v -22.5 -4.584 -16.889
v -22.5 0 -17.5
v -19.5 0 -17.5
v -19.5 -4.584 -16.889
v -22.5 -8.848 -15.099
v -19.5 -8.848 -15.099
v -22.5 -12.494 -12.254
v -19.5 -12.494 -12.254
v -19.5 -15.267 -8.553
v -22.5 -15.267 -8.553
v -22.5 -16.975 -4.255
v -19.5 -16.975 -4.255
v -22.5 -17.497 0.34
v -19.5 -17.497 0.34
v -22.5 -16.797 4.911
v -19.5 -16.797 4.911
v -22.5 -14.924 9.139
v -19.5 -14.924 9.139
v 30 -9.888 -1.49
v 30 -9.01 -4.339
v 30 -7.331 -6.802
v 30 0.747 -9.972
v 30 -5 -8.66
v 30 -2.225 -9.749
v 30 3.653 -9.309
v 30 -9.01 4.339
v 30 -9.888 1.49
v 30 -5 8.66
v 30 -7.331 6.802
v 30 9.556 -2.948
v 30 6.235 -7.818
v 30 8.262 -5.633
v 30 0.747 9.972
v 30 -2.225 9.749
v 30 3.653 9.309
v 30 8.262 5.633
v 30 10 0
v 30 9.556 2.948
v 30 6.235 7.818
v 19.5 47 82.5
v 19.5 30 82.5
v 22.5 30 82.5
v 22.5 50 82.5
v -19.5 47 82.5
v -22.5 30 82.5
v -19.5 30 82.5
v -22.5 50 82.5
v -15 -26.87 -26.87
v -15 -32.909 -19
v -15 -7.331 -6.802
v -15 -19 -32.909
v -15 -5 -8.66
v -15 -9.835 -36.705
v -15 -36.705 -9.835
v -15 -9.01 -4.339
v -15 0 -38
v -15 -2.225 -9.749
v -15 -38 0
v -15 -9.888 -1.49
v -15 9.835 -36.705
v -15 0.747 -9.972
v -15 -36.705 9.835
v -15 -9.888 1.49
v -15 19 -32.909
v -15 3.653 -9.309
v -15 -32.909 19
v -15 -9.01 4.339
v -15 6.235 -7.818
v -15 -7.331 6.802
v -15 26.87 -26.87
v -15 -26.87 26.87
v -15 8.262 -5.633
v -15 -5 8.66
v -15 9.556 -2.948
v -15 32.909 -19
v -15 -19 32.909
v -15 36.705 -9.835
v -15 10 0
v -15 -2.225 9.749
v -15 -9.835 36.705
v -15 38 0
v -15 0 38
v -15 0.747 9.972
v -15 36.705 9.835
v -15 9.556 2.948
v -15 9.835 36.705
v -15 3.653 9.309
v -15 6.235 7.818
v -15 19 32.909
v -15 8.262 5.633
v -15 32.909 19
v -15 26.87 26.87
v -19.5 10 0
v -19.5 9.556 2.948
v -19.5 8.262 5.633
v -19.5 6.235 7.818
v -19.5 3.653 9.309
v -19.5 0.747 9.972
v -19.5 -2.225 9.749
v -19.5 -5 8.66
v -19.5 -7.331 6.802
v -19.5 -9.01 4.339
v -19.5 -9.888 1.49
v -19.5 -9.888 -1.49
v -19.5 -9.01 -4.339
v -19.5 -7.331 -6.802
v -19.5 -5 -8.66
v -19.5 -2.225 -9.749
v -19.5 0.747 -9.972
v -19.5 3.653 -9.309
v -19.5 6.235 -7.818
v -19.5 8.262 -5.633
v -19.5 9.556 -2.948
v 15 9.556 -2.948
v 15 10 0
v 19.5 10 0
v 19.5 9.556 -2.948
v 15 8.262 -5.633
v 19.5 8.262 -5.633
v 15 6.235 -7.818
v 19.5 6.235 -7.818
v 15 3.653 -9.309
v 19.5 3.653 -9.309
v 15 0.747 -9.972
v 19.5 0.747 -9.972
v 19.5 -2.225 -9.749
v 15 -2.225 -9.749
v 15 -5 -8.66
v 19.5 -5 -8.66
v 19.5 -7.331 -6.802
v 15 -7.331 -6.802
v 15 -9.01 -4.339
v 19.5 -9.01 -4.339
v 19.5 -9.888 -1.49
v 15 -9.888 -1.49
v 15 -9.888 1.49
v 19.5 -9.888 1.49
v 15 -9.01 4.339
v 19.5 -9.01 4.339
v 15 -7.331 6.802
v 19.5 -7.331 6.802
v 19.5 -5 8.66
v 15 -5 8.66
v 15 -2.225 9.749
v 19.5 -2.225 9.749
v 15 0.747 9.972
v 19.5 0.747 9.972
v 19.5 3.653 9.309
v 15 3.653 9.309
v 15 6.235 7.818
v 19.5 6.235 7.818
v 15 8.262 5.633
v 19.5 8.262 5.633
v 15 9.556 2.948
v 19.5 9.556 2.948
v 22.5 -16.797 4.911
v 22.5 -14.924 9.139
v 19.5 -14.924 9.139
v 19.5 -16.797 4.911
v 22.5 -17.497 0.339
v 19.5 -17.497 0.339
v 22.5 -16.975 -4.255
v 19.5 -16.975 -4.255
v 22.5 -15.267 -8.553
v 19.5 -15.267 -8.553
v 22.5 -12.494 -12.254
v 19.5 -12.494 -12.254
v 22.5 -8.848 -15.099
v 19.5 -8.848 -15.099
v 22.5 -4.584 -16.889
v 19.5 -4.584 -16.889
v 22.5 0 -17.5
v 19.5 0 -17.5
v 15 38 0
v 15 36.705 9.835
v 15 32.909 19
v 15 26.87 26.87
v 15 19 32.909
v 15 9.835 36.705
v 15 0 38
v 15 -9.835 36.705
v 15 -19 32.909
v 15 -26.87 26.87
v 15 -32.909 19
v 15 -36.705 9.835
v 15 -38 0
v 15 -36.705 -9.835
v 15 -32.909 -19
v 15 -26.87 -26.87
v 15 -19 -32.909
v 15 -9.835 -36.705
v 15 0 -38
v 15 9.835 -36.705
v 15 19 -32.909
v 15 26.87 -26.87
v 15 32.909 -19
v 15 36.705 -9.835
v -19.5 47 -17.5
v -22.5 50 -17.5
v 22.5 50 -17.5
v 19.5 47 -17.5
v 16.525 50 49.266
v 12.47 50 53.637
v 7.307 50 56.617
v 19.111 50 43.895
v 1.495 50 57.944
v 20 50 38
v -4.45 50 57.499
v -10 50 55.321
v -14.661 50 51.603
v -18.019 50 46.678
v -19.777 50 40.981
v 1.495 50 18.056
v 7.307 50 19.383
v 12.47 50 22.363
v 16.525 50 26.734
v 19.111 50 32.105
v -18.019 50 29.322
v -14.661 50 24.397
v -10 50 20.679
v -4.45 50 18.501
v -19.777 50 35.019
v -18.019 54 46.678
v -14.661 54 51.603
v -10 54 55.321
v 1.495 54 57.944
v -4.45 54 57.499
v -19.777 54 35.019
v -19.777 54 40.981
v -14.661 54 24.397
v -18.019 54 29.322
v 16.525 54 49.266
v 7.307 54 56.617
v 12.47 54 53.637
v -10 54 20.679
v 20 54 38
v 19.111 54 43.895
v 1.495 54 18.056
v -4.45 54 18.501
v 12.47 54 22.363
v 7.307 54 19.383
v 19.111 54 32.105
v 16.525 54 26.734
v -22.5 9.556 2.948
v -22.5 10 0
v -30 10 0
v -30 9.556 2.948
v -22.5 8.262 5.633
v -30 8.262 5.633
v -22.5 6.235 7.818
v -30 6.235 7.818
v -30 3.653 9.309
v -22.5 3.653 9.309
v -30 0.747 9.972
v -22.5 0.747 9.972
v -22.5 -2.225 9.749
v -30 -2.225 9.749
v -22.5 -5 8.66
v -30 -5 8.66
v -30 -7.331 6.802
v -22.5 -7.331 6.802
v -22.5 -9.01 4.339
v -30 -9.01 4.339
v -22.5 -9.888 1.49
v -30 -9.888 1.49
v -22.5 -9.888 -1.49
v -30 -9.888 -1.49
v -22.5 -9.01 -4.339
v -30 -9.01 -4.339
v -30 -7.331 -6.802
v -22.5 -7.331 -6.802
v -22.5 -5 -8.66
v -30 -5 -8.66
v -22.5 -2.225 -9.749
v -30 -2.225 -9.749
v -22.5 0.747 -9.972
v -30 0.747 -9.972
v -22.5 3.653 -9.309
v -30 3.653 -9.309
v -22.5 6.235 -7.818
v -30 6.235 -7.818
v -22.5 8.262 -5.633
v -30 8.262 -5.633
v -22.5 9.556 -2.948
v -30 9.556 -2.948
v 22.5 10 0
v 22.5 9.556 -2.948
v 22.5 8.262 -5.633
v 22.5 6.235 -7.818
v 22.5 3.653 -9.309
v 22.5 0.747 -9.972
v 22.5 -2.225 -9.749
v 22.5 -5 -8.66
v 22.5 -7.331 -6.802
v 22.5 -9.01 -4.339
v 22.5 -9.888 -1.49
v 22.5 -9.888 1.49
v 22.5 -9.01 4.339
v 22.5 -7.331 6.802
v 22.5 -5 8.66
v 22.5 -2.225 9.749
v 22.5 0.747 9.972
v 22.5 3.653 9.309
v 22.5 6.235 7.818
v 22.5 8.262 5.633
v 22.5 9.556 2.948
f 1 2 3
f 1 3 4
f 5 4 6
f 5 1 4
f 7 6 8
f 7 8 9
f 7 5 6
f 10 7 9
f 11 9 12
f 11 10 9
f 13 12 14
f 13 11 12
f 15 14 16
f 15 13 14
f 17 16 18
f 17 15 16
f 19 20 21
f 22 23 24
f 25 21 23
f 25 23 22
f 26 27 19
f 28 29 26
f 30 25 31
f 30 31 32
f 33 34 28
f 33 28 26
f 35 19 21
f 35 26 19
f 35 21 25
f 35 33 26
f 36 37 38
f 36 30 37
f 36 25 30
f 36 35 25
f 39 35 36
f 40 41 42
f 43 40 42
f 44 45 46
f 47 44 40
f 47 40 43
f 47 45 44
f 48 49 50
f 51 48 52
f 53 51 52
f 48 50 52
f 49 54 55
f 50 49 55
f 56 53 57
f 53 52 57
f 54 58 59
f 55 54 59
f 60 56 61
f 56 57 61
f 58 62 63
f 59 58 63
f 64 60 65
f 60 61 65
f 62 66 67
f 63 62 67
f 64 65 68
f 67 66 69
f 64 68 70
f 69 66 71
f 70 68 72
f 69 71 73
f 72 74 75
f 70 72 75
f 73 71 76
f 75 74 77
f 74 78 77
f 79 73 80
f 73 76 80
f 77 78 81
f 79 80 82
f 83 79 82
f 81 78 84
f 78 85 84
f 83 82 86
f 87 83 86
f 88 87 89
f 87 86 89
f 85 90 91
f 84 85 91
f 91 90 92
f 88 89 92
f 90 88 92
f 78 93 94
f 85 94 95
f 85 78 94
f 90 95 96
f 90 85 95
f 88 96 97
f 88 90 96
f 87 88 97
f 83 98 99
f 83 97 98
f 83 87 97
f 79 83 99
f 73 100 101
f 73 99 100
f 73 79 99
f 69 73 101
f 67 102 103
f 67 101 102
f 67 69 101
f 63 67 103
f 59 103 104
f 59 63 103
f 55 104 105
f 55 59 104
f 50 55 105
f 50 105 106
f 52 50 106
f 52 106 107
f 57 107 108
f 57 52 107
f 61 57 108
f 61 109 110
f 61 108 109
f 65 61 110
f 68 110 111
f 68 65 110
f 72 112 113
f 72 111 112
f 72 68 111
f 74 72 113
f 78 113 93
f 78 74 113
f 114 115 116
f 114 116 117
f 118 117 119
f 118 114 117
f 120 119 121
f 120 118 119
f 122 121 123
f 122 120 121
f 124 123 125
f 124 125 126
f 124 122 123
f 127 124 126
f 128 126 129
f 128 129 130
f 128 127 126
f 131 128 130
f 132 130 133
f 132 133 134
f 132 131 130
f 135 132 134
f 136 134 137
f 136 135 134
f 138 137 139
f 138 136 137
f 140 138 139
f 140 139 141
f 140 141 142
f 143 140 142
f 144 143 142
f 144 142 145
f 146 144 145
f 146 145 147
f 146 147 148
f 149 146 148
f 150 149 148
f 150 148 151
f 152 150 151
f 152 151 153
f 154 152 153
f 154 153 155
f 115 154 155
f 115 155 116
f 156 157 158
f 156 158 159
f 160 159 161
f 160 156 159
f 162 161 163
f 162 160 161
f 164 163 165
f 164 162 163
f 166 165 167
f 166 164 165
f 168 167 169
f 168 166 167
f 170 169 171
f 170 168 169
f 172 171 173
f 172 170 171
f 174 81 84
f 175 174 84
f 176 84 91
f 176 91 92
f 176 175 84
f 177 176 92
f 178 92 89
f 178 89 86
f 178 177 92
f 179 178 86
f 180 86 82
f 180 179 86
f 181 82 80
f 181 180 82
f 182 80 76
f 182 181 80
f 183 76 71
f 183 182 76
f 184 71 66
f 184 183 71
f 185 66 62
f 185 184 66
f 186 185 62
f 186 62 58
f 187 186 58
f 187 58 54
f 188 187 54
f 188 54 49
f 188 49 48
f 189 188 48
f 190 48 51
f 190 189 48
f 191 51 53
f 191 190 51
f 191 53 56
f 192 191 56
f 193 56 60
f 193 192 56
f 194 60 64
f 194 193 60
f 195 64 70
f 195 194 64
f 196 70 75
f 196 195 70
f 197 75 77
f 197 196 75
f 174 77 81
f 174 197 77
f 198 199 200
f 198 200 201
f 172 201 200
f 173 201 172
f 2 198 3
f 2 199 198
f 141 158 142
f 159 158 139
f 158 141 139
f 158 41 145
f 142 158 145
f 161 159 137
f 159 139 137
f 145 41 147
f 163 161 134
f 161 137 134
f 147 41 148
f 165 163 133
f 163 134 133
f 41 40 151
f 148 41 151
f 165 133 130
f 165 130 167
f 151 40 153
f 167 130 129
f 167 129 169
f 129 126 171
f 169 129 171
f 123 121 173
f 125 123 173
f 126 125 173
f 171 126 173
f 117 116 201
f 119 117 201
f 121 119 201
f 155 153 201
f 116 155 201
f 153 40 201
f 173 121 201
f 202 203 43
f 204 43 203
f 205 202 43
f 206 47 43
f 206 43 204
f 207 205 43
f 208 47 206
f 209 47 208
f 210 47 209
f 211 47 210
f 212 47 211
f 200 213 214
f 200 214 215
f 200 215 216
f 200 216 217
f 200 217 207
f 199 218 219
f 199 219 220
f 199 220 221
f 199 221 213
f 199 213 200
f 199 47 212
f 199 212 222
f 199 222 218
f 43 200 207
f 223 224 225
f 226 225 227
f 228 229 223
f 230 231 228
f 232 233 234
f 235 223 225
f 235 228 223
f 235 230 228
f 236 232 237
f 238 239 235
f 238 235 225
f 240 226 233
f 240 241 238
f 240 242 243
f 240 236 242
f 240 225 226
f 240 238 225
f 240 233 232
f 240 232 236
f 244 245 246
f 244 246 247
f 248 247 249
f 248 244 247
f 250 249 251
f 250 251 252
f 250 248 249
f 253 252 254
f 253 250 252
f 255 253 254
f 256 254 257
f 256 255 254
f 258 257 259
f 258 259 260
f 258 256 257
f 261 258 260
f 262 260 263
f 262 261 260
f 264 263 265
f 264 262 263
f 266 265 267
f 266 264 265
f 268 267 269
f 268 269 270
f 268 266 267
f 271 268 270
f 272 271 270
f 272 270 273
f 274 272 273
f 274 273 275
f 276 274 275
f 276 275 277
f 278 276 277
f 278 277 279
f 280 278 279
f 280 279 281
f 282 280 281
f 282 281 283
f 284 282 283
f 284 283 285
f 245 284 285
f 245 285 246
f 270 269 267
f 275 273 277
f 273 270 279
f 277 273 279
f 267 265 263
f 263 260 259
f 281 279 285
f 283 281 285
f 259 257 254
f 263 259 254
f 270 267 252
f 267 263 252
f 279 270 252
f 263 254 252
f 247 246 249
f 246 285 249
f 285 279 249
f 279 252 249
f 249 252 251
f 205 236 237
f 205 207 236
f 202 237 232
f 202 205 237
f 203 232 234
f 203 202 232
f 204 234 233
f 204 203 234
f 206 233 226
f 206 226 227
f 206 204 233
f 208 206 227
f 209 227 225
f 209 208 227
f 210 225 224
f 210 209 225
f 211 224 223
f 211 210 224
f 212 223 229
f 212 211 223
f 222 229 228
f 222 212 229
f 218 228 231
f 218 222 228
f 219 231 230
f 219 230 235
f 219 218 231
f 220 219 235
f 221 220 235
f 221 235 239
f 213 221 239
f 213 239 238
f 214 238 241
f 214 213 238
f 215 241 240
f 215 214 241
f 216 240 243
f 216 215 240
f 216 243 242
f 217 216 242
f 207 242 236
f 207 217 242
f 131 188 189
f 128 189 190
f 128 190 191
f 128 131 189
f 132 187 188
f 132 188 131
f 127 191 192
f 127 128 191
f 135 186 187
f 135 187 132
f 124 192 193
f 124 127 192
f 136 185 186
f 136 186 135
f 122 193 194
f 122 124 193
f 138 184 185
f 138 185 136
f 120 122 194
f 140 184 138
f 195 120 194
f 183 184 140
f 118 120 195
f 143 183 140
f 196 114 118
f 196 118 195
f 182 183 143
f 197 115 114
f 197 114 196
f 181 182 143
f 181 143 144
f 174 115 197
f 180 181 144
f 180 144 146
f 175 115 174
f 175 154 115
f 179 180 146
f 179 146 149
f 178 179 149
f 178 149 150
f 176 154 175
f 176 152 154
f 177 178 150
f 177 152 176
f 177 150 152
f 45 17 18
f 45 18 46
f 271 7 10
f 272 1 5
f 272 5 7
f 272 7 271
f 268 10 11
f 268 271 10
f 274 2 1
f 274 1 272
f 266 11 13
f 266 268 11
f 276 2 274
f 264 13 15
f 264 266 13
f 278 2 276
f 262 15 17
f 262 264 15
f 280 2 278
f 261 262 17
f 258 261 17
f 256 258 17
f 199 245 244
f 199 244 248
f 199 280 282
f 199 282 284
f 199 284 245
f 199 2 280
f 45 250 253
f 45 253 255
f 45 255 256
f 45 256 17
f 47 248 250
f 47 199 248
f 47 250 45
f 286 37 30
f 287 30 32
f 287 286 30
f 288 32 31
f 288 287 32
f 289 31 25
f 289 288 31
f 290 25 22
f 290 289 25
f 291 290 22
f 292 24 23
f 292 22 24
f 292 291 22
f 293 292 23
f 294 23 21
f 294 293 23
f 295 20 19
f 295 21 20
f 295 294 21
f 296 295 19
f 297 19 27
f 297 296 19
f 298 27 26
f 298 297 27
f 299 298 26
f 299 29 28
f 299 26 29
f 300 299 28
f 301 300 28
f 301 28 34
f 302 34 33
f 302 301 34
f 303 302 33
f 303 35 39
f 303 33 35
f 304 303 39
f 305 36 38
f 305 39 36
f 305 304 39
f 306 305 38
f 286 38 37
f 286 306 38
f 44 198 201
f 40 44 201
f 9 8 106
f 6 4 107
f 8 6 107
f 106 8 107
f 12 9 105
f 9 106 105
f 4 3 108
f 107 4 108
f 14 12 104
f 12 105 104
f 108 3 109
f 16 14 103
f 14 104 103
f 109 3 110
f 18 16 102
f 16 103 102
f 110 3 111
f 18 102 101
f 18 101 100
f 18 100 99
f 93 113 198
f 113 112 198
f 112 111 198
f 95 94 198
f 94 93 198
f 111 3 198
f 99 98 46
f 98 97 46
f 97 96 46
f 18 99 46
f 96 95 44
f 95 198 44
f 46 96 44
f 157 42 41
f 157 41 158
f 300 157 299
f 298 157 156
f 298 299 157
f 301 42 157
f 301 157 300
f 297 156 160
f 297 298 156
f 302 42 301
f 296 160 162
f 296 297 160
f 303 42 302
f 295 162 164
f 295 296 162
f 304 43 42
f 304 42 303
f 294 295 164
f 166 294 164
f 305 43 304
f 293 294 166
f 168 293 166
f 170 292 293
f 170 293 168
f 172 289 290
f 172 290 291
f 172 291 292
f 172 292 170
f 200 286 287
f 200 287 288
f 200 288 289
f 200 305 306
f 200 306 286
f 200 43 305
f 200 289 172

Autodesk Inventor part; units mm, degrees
ref_plane "YZ Plane" through (0, 0, 0) normal (1, 0, 0) x (0, 1, 0)
sketch "Sketch1" plane through (0, 0, 0) normal (1, 0, 0) x (0, 1, 0)
  circle A0 centre (0, 0) radius 38
  dimension "d0" = 76
extrude "Extrusion1" add sketch "Sketch1" along normal mid plane 30
sketch "Sketch2" plane through (0, 0, 0) normal (1, 0, 0) x (0, 1, 0)
  circle A0 centre (0, 0) radius 10
  dimension "d3" = 20
extrude "Extrusion2" add sketch "Sketch2" along normal mid plane 60
ref_plane "Work Plane1" through (22.5, 0, 0) normal (1, 0, 0) x (0, 0, -1)
sketch "Sketch3" plane through (22.5, 0, 0) normal (1, 0, 0) x (0, 0, -1)
  circle A0 centre (0, 0) radius 10 projected
  circle A1 centre (0, 0) radius 10
  circle A2 centre (0, 0) radius 17.5
  line L0 (-82.5, 50) -> (17.5, 50)
  circle A3 centre (0, 0) radius 38 projected
  line L1 (17.5, 0) -> (17.5, 50)
  line L2 (-82.5, 50) -> (-82.5, 30)
  line L3 (-82.5, 30) -> (-9.1391, -14.9241)
  point P0 (-38, 0)
  dimension "d6" = 35
  dimension "d7" = 50
  dimension "d8" = 100
  dimension "d9" = 20
extrude "Extrusion3" add sketch "Sketch3" against normal blind 3 contours A2 | A2 L3 A3 L1 | A3 L3 L2 L0 L1 picked at (-15.7584, 26.6707)
ref_plane "Work Plane2" through (-22.5, 0, 0) normal (-1, 0, 0) x (0, 0, 1)
sketch "Sketch4" plane through (-22.5, 0, 0) normal (-1, 0, 0) x (0, 0, 1)
  line L0 (9.1391, -14.9241) -> (82.5, 30) projected
  line L1 (82.5, 30) -> (82.5, 50) projected
  line L2 (82.5, 50) -> (-17.5, 50) projected
  line L3 (-17.5, 50) -> (-17.5, 0) projected
  arc A0 (-17.5, 0) -> (9.1391, -14.9241) centre (0, 0) ccw projected
  circle A1 centre (0, 0) radius 10 projected
extrude "Extrusion4" add sketch "Sketch4" against normal blind 3
sketch "Sketch5" plane through (-22.5, 50, 82.5) normal (0, 1, 0) x (1, 0, 0)
  line L0 (0, 0) -> (0, 100) projected
  line L1 (0, 0) -> (3, 0) projected
  line L2 (3, 100) -> (3, 0) projected
  line L3 (0, 100) -> (3, 100) projected
  line L4 (45, 100) -> (45, 0) projected
  line L5 (45, 100) -> (42, 100) projected
  line L6 (42, 0) -> (42, 100) projected
  line L7 (45, 0) -> (42, 0) projected
  line L8 (0, 100) -> (45, 100)
  line L9 (45, 100) -> (45, 0)
  line L10 (45, 0) -> (0, 0)
  line L11 (0, 0) -> (0, 100)
  point P0 (22.5, 82.5)
extrude "Extrusion5" add sketch "Sketch5" against normal blind 3
sketch "Sketch6" plane through (22.5, 50, 82.5) normal (0, 1, 0) x (1, 0, 0)
  line L0 (-37.5, 120.5) -> (-37.5, 44.5) projected
  line L1 (-7.5, 44.5) -> (-7.5, 120.5) projected
  line L2 (-37.5, 44.5) -> (-7.5, 44.5) construction
  circle A0 centre (-22.5, 44.5) radius 20
  point P0 (-22.5, 82.5)
  dimension "d16" = 40
extrude "Extrusion6" add sketch "Sketch6" along normal blind 4
properties part number "assist_wheel" material "Steel, Alloy"
